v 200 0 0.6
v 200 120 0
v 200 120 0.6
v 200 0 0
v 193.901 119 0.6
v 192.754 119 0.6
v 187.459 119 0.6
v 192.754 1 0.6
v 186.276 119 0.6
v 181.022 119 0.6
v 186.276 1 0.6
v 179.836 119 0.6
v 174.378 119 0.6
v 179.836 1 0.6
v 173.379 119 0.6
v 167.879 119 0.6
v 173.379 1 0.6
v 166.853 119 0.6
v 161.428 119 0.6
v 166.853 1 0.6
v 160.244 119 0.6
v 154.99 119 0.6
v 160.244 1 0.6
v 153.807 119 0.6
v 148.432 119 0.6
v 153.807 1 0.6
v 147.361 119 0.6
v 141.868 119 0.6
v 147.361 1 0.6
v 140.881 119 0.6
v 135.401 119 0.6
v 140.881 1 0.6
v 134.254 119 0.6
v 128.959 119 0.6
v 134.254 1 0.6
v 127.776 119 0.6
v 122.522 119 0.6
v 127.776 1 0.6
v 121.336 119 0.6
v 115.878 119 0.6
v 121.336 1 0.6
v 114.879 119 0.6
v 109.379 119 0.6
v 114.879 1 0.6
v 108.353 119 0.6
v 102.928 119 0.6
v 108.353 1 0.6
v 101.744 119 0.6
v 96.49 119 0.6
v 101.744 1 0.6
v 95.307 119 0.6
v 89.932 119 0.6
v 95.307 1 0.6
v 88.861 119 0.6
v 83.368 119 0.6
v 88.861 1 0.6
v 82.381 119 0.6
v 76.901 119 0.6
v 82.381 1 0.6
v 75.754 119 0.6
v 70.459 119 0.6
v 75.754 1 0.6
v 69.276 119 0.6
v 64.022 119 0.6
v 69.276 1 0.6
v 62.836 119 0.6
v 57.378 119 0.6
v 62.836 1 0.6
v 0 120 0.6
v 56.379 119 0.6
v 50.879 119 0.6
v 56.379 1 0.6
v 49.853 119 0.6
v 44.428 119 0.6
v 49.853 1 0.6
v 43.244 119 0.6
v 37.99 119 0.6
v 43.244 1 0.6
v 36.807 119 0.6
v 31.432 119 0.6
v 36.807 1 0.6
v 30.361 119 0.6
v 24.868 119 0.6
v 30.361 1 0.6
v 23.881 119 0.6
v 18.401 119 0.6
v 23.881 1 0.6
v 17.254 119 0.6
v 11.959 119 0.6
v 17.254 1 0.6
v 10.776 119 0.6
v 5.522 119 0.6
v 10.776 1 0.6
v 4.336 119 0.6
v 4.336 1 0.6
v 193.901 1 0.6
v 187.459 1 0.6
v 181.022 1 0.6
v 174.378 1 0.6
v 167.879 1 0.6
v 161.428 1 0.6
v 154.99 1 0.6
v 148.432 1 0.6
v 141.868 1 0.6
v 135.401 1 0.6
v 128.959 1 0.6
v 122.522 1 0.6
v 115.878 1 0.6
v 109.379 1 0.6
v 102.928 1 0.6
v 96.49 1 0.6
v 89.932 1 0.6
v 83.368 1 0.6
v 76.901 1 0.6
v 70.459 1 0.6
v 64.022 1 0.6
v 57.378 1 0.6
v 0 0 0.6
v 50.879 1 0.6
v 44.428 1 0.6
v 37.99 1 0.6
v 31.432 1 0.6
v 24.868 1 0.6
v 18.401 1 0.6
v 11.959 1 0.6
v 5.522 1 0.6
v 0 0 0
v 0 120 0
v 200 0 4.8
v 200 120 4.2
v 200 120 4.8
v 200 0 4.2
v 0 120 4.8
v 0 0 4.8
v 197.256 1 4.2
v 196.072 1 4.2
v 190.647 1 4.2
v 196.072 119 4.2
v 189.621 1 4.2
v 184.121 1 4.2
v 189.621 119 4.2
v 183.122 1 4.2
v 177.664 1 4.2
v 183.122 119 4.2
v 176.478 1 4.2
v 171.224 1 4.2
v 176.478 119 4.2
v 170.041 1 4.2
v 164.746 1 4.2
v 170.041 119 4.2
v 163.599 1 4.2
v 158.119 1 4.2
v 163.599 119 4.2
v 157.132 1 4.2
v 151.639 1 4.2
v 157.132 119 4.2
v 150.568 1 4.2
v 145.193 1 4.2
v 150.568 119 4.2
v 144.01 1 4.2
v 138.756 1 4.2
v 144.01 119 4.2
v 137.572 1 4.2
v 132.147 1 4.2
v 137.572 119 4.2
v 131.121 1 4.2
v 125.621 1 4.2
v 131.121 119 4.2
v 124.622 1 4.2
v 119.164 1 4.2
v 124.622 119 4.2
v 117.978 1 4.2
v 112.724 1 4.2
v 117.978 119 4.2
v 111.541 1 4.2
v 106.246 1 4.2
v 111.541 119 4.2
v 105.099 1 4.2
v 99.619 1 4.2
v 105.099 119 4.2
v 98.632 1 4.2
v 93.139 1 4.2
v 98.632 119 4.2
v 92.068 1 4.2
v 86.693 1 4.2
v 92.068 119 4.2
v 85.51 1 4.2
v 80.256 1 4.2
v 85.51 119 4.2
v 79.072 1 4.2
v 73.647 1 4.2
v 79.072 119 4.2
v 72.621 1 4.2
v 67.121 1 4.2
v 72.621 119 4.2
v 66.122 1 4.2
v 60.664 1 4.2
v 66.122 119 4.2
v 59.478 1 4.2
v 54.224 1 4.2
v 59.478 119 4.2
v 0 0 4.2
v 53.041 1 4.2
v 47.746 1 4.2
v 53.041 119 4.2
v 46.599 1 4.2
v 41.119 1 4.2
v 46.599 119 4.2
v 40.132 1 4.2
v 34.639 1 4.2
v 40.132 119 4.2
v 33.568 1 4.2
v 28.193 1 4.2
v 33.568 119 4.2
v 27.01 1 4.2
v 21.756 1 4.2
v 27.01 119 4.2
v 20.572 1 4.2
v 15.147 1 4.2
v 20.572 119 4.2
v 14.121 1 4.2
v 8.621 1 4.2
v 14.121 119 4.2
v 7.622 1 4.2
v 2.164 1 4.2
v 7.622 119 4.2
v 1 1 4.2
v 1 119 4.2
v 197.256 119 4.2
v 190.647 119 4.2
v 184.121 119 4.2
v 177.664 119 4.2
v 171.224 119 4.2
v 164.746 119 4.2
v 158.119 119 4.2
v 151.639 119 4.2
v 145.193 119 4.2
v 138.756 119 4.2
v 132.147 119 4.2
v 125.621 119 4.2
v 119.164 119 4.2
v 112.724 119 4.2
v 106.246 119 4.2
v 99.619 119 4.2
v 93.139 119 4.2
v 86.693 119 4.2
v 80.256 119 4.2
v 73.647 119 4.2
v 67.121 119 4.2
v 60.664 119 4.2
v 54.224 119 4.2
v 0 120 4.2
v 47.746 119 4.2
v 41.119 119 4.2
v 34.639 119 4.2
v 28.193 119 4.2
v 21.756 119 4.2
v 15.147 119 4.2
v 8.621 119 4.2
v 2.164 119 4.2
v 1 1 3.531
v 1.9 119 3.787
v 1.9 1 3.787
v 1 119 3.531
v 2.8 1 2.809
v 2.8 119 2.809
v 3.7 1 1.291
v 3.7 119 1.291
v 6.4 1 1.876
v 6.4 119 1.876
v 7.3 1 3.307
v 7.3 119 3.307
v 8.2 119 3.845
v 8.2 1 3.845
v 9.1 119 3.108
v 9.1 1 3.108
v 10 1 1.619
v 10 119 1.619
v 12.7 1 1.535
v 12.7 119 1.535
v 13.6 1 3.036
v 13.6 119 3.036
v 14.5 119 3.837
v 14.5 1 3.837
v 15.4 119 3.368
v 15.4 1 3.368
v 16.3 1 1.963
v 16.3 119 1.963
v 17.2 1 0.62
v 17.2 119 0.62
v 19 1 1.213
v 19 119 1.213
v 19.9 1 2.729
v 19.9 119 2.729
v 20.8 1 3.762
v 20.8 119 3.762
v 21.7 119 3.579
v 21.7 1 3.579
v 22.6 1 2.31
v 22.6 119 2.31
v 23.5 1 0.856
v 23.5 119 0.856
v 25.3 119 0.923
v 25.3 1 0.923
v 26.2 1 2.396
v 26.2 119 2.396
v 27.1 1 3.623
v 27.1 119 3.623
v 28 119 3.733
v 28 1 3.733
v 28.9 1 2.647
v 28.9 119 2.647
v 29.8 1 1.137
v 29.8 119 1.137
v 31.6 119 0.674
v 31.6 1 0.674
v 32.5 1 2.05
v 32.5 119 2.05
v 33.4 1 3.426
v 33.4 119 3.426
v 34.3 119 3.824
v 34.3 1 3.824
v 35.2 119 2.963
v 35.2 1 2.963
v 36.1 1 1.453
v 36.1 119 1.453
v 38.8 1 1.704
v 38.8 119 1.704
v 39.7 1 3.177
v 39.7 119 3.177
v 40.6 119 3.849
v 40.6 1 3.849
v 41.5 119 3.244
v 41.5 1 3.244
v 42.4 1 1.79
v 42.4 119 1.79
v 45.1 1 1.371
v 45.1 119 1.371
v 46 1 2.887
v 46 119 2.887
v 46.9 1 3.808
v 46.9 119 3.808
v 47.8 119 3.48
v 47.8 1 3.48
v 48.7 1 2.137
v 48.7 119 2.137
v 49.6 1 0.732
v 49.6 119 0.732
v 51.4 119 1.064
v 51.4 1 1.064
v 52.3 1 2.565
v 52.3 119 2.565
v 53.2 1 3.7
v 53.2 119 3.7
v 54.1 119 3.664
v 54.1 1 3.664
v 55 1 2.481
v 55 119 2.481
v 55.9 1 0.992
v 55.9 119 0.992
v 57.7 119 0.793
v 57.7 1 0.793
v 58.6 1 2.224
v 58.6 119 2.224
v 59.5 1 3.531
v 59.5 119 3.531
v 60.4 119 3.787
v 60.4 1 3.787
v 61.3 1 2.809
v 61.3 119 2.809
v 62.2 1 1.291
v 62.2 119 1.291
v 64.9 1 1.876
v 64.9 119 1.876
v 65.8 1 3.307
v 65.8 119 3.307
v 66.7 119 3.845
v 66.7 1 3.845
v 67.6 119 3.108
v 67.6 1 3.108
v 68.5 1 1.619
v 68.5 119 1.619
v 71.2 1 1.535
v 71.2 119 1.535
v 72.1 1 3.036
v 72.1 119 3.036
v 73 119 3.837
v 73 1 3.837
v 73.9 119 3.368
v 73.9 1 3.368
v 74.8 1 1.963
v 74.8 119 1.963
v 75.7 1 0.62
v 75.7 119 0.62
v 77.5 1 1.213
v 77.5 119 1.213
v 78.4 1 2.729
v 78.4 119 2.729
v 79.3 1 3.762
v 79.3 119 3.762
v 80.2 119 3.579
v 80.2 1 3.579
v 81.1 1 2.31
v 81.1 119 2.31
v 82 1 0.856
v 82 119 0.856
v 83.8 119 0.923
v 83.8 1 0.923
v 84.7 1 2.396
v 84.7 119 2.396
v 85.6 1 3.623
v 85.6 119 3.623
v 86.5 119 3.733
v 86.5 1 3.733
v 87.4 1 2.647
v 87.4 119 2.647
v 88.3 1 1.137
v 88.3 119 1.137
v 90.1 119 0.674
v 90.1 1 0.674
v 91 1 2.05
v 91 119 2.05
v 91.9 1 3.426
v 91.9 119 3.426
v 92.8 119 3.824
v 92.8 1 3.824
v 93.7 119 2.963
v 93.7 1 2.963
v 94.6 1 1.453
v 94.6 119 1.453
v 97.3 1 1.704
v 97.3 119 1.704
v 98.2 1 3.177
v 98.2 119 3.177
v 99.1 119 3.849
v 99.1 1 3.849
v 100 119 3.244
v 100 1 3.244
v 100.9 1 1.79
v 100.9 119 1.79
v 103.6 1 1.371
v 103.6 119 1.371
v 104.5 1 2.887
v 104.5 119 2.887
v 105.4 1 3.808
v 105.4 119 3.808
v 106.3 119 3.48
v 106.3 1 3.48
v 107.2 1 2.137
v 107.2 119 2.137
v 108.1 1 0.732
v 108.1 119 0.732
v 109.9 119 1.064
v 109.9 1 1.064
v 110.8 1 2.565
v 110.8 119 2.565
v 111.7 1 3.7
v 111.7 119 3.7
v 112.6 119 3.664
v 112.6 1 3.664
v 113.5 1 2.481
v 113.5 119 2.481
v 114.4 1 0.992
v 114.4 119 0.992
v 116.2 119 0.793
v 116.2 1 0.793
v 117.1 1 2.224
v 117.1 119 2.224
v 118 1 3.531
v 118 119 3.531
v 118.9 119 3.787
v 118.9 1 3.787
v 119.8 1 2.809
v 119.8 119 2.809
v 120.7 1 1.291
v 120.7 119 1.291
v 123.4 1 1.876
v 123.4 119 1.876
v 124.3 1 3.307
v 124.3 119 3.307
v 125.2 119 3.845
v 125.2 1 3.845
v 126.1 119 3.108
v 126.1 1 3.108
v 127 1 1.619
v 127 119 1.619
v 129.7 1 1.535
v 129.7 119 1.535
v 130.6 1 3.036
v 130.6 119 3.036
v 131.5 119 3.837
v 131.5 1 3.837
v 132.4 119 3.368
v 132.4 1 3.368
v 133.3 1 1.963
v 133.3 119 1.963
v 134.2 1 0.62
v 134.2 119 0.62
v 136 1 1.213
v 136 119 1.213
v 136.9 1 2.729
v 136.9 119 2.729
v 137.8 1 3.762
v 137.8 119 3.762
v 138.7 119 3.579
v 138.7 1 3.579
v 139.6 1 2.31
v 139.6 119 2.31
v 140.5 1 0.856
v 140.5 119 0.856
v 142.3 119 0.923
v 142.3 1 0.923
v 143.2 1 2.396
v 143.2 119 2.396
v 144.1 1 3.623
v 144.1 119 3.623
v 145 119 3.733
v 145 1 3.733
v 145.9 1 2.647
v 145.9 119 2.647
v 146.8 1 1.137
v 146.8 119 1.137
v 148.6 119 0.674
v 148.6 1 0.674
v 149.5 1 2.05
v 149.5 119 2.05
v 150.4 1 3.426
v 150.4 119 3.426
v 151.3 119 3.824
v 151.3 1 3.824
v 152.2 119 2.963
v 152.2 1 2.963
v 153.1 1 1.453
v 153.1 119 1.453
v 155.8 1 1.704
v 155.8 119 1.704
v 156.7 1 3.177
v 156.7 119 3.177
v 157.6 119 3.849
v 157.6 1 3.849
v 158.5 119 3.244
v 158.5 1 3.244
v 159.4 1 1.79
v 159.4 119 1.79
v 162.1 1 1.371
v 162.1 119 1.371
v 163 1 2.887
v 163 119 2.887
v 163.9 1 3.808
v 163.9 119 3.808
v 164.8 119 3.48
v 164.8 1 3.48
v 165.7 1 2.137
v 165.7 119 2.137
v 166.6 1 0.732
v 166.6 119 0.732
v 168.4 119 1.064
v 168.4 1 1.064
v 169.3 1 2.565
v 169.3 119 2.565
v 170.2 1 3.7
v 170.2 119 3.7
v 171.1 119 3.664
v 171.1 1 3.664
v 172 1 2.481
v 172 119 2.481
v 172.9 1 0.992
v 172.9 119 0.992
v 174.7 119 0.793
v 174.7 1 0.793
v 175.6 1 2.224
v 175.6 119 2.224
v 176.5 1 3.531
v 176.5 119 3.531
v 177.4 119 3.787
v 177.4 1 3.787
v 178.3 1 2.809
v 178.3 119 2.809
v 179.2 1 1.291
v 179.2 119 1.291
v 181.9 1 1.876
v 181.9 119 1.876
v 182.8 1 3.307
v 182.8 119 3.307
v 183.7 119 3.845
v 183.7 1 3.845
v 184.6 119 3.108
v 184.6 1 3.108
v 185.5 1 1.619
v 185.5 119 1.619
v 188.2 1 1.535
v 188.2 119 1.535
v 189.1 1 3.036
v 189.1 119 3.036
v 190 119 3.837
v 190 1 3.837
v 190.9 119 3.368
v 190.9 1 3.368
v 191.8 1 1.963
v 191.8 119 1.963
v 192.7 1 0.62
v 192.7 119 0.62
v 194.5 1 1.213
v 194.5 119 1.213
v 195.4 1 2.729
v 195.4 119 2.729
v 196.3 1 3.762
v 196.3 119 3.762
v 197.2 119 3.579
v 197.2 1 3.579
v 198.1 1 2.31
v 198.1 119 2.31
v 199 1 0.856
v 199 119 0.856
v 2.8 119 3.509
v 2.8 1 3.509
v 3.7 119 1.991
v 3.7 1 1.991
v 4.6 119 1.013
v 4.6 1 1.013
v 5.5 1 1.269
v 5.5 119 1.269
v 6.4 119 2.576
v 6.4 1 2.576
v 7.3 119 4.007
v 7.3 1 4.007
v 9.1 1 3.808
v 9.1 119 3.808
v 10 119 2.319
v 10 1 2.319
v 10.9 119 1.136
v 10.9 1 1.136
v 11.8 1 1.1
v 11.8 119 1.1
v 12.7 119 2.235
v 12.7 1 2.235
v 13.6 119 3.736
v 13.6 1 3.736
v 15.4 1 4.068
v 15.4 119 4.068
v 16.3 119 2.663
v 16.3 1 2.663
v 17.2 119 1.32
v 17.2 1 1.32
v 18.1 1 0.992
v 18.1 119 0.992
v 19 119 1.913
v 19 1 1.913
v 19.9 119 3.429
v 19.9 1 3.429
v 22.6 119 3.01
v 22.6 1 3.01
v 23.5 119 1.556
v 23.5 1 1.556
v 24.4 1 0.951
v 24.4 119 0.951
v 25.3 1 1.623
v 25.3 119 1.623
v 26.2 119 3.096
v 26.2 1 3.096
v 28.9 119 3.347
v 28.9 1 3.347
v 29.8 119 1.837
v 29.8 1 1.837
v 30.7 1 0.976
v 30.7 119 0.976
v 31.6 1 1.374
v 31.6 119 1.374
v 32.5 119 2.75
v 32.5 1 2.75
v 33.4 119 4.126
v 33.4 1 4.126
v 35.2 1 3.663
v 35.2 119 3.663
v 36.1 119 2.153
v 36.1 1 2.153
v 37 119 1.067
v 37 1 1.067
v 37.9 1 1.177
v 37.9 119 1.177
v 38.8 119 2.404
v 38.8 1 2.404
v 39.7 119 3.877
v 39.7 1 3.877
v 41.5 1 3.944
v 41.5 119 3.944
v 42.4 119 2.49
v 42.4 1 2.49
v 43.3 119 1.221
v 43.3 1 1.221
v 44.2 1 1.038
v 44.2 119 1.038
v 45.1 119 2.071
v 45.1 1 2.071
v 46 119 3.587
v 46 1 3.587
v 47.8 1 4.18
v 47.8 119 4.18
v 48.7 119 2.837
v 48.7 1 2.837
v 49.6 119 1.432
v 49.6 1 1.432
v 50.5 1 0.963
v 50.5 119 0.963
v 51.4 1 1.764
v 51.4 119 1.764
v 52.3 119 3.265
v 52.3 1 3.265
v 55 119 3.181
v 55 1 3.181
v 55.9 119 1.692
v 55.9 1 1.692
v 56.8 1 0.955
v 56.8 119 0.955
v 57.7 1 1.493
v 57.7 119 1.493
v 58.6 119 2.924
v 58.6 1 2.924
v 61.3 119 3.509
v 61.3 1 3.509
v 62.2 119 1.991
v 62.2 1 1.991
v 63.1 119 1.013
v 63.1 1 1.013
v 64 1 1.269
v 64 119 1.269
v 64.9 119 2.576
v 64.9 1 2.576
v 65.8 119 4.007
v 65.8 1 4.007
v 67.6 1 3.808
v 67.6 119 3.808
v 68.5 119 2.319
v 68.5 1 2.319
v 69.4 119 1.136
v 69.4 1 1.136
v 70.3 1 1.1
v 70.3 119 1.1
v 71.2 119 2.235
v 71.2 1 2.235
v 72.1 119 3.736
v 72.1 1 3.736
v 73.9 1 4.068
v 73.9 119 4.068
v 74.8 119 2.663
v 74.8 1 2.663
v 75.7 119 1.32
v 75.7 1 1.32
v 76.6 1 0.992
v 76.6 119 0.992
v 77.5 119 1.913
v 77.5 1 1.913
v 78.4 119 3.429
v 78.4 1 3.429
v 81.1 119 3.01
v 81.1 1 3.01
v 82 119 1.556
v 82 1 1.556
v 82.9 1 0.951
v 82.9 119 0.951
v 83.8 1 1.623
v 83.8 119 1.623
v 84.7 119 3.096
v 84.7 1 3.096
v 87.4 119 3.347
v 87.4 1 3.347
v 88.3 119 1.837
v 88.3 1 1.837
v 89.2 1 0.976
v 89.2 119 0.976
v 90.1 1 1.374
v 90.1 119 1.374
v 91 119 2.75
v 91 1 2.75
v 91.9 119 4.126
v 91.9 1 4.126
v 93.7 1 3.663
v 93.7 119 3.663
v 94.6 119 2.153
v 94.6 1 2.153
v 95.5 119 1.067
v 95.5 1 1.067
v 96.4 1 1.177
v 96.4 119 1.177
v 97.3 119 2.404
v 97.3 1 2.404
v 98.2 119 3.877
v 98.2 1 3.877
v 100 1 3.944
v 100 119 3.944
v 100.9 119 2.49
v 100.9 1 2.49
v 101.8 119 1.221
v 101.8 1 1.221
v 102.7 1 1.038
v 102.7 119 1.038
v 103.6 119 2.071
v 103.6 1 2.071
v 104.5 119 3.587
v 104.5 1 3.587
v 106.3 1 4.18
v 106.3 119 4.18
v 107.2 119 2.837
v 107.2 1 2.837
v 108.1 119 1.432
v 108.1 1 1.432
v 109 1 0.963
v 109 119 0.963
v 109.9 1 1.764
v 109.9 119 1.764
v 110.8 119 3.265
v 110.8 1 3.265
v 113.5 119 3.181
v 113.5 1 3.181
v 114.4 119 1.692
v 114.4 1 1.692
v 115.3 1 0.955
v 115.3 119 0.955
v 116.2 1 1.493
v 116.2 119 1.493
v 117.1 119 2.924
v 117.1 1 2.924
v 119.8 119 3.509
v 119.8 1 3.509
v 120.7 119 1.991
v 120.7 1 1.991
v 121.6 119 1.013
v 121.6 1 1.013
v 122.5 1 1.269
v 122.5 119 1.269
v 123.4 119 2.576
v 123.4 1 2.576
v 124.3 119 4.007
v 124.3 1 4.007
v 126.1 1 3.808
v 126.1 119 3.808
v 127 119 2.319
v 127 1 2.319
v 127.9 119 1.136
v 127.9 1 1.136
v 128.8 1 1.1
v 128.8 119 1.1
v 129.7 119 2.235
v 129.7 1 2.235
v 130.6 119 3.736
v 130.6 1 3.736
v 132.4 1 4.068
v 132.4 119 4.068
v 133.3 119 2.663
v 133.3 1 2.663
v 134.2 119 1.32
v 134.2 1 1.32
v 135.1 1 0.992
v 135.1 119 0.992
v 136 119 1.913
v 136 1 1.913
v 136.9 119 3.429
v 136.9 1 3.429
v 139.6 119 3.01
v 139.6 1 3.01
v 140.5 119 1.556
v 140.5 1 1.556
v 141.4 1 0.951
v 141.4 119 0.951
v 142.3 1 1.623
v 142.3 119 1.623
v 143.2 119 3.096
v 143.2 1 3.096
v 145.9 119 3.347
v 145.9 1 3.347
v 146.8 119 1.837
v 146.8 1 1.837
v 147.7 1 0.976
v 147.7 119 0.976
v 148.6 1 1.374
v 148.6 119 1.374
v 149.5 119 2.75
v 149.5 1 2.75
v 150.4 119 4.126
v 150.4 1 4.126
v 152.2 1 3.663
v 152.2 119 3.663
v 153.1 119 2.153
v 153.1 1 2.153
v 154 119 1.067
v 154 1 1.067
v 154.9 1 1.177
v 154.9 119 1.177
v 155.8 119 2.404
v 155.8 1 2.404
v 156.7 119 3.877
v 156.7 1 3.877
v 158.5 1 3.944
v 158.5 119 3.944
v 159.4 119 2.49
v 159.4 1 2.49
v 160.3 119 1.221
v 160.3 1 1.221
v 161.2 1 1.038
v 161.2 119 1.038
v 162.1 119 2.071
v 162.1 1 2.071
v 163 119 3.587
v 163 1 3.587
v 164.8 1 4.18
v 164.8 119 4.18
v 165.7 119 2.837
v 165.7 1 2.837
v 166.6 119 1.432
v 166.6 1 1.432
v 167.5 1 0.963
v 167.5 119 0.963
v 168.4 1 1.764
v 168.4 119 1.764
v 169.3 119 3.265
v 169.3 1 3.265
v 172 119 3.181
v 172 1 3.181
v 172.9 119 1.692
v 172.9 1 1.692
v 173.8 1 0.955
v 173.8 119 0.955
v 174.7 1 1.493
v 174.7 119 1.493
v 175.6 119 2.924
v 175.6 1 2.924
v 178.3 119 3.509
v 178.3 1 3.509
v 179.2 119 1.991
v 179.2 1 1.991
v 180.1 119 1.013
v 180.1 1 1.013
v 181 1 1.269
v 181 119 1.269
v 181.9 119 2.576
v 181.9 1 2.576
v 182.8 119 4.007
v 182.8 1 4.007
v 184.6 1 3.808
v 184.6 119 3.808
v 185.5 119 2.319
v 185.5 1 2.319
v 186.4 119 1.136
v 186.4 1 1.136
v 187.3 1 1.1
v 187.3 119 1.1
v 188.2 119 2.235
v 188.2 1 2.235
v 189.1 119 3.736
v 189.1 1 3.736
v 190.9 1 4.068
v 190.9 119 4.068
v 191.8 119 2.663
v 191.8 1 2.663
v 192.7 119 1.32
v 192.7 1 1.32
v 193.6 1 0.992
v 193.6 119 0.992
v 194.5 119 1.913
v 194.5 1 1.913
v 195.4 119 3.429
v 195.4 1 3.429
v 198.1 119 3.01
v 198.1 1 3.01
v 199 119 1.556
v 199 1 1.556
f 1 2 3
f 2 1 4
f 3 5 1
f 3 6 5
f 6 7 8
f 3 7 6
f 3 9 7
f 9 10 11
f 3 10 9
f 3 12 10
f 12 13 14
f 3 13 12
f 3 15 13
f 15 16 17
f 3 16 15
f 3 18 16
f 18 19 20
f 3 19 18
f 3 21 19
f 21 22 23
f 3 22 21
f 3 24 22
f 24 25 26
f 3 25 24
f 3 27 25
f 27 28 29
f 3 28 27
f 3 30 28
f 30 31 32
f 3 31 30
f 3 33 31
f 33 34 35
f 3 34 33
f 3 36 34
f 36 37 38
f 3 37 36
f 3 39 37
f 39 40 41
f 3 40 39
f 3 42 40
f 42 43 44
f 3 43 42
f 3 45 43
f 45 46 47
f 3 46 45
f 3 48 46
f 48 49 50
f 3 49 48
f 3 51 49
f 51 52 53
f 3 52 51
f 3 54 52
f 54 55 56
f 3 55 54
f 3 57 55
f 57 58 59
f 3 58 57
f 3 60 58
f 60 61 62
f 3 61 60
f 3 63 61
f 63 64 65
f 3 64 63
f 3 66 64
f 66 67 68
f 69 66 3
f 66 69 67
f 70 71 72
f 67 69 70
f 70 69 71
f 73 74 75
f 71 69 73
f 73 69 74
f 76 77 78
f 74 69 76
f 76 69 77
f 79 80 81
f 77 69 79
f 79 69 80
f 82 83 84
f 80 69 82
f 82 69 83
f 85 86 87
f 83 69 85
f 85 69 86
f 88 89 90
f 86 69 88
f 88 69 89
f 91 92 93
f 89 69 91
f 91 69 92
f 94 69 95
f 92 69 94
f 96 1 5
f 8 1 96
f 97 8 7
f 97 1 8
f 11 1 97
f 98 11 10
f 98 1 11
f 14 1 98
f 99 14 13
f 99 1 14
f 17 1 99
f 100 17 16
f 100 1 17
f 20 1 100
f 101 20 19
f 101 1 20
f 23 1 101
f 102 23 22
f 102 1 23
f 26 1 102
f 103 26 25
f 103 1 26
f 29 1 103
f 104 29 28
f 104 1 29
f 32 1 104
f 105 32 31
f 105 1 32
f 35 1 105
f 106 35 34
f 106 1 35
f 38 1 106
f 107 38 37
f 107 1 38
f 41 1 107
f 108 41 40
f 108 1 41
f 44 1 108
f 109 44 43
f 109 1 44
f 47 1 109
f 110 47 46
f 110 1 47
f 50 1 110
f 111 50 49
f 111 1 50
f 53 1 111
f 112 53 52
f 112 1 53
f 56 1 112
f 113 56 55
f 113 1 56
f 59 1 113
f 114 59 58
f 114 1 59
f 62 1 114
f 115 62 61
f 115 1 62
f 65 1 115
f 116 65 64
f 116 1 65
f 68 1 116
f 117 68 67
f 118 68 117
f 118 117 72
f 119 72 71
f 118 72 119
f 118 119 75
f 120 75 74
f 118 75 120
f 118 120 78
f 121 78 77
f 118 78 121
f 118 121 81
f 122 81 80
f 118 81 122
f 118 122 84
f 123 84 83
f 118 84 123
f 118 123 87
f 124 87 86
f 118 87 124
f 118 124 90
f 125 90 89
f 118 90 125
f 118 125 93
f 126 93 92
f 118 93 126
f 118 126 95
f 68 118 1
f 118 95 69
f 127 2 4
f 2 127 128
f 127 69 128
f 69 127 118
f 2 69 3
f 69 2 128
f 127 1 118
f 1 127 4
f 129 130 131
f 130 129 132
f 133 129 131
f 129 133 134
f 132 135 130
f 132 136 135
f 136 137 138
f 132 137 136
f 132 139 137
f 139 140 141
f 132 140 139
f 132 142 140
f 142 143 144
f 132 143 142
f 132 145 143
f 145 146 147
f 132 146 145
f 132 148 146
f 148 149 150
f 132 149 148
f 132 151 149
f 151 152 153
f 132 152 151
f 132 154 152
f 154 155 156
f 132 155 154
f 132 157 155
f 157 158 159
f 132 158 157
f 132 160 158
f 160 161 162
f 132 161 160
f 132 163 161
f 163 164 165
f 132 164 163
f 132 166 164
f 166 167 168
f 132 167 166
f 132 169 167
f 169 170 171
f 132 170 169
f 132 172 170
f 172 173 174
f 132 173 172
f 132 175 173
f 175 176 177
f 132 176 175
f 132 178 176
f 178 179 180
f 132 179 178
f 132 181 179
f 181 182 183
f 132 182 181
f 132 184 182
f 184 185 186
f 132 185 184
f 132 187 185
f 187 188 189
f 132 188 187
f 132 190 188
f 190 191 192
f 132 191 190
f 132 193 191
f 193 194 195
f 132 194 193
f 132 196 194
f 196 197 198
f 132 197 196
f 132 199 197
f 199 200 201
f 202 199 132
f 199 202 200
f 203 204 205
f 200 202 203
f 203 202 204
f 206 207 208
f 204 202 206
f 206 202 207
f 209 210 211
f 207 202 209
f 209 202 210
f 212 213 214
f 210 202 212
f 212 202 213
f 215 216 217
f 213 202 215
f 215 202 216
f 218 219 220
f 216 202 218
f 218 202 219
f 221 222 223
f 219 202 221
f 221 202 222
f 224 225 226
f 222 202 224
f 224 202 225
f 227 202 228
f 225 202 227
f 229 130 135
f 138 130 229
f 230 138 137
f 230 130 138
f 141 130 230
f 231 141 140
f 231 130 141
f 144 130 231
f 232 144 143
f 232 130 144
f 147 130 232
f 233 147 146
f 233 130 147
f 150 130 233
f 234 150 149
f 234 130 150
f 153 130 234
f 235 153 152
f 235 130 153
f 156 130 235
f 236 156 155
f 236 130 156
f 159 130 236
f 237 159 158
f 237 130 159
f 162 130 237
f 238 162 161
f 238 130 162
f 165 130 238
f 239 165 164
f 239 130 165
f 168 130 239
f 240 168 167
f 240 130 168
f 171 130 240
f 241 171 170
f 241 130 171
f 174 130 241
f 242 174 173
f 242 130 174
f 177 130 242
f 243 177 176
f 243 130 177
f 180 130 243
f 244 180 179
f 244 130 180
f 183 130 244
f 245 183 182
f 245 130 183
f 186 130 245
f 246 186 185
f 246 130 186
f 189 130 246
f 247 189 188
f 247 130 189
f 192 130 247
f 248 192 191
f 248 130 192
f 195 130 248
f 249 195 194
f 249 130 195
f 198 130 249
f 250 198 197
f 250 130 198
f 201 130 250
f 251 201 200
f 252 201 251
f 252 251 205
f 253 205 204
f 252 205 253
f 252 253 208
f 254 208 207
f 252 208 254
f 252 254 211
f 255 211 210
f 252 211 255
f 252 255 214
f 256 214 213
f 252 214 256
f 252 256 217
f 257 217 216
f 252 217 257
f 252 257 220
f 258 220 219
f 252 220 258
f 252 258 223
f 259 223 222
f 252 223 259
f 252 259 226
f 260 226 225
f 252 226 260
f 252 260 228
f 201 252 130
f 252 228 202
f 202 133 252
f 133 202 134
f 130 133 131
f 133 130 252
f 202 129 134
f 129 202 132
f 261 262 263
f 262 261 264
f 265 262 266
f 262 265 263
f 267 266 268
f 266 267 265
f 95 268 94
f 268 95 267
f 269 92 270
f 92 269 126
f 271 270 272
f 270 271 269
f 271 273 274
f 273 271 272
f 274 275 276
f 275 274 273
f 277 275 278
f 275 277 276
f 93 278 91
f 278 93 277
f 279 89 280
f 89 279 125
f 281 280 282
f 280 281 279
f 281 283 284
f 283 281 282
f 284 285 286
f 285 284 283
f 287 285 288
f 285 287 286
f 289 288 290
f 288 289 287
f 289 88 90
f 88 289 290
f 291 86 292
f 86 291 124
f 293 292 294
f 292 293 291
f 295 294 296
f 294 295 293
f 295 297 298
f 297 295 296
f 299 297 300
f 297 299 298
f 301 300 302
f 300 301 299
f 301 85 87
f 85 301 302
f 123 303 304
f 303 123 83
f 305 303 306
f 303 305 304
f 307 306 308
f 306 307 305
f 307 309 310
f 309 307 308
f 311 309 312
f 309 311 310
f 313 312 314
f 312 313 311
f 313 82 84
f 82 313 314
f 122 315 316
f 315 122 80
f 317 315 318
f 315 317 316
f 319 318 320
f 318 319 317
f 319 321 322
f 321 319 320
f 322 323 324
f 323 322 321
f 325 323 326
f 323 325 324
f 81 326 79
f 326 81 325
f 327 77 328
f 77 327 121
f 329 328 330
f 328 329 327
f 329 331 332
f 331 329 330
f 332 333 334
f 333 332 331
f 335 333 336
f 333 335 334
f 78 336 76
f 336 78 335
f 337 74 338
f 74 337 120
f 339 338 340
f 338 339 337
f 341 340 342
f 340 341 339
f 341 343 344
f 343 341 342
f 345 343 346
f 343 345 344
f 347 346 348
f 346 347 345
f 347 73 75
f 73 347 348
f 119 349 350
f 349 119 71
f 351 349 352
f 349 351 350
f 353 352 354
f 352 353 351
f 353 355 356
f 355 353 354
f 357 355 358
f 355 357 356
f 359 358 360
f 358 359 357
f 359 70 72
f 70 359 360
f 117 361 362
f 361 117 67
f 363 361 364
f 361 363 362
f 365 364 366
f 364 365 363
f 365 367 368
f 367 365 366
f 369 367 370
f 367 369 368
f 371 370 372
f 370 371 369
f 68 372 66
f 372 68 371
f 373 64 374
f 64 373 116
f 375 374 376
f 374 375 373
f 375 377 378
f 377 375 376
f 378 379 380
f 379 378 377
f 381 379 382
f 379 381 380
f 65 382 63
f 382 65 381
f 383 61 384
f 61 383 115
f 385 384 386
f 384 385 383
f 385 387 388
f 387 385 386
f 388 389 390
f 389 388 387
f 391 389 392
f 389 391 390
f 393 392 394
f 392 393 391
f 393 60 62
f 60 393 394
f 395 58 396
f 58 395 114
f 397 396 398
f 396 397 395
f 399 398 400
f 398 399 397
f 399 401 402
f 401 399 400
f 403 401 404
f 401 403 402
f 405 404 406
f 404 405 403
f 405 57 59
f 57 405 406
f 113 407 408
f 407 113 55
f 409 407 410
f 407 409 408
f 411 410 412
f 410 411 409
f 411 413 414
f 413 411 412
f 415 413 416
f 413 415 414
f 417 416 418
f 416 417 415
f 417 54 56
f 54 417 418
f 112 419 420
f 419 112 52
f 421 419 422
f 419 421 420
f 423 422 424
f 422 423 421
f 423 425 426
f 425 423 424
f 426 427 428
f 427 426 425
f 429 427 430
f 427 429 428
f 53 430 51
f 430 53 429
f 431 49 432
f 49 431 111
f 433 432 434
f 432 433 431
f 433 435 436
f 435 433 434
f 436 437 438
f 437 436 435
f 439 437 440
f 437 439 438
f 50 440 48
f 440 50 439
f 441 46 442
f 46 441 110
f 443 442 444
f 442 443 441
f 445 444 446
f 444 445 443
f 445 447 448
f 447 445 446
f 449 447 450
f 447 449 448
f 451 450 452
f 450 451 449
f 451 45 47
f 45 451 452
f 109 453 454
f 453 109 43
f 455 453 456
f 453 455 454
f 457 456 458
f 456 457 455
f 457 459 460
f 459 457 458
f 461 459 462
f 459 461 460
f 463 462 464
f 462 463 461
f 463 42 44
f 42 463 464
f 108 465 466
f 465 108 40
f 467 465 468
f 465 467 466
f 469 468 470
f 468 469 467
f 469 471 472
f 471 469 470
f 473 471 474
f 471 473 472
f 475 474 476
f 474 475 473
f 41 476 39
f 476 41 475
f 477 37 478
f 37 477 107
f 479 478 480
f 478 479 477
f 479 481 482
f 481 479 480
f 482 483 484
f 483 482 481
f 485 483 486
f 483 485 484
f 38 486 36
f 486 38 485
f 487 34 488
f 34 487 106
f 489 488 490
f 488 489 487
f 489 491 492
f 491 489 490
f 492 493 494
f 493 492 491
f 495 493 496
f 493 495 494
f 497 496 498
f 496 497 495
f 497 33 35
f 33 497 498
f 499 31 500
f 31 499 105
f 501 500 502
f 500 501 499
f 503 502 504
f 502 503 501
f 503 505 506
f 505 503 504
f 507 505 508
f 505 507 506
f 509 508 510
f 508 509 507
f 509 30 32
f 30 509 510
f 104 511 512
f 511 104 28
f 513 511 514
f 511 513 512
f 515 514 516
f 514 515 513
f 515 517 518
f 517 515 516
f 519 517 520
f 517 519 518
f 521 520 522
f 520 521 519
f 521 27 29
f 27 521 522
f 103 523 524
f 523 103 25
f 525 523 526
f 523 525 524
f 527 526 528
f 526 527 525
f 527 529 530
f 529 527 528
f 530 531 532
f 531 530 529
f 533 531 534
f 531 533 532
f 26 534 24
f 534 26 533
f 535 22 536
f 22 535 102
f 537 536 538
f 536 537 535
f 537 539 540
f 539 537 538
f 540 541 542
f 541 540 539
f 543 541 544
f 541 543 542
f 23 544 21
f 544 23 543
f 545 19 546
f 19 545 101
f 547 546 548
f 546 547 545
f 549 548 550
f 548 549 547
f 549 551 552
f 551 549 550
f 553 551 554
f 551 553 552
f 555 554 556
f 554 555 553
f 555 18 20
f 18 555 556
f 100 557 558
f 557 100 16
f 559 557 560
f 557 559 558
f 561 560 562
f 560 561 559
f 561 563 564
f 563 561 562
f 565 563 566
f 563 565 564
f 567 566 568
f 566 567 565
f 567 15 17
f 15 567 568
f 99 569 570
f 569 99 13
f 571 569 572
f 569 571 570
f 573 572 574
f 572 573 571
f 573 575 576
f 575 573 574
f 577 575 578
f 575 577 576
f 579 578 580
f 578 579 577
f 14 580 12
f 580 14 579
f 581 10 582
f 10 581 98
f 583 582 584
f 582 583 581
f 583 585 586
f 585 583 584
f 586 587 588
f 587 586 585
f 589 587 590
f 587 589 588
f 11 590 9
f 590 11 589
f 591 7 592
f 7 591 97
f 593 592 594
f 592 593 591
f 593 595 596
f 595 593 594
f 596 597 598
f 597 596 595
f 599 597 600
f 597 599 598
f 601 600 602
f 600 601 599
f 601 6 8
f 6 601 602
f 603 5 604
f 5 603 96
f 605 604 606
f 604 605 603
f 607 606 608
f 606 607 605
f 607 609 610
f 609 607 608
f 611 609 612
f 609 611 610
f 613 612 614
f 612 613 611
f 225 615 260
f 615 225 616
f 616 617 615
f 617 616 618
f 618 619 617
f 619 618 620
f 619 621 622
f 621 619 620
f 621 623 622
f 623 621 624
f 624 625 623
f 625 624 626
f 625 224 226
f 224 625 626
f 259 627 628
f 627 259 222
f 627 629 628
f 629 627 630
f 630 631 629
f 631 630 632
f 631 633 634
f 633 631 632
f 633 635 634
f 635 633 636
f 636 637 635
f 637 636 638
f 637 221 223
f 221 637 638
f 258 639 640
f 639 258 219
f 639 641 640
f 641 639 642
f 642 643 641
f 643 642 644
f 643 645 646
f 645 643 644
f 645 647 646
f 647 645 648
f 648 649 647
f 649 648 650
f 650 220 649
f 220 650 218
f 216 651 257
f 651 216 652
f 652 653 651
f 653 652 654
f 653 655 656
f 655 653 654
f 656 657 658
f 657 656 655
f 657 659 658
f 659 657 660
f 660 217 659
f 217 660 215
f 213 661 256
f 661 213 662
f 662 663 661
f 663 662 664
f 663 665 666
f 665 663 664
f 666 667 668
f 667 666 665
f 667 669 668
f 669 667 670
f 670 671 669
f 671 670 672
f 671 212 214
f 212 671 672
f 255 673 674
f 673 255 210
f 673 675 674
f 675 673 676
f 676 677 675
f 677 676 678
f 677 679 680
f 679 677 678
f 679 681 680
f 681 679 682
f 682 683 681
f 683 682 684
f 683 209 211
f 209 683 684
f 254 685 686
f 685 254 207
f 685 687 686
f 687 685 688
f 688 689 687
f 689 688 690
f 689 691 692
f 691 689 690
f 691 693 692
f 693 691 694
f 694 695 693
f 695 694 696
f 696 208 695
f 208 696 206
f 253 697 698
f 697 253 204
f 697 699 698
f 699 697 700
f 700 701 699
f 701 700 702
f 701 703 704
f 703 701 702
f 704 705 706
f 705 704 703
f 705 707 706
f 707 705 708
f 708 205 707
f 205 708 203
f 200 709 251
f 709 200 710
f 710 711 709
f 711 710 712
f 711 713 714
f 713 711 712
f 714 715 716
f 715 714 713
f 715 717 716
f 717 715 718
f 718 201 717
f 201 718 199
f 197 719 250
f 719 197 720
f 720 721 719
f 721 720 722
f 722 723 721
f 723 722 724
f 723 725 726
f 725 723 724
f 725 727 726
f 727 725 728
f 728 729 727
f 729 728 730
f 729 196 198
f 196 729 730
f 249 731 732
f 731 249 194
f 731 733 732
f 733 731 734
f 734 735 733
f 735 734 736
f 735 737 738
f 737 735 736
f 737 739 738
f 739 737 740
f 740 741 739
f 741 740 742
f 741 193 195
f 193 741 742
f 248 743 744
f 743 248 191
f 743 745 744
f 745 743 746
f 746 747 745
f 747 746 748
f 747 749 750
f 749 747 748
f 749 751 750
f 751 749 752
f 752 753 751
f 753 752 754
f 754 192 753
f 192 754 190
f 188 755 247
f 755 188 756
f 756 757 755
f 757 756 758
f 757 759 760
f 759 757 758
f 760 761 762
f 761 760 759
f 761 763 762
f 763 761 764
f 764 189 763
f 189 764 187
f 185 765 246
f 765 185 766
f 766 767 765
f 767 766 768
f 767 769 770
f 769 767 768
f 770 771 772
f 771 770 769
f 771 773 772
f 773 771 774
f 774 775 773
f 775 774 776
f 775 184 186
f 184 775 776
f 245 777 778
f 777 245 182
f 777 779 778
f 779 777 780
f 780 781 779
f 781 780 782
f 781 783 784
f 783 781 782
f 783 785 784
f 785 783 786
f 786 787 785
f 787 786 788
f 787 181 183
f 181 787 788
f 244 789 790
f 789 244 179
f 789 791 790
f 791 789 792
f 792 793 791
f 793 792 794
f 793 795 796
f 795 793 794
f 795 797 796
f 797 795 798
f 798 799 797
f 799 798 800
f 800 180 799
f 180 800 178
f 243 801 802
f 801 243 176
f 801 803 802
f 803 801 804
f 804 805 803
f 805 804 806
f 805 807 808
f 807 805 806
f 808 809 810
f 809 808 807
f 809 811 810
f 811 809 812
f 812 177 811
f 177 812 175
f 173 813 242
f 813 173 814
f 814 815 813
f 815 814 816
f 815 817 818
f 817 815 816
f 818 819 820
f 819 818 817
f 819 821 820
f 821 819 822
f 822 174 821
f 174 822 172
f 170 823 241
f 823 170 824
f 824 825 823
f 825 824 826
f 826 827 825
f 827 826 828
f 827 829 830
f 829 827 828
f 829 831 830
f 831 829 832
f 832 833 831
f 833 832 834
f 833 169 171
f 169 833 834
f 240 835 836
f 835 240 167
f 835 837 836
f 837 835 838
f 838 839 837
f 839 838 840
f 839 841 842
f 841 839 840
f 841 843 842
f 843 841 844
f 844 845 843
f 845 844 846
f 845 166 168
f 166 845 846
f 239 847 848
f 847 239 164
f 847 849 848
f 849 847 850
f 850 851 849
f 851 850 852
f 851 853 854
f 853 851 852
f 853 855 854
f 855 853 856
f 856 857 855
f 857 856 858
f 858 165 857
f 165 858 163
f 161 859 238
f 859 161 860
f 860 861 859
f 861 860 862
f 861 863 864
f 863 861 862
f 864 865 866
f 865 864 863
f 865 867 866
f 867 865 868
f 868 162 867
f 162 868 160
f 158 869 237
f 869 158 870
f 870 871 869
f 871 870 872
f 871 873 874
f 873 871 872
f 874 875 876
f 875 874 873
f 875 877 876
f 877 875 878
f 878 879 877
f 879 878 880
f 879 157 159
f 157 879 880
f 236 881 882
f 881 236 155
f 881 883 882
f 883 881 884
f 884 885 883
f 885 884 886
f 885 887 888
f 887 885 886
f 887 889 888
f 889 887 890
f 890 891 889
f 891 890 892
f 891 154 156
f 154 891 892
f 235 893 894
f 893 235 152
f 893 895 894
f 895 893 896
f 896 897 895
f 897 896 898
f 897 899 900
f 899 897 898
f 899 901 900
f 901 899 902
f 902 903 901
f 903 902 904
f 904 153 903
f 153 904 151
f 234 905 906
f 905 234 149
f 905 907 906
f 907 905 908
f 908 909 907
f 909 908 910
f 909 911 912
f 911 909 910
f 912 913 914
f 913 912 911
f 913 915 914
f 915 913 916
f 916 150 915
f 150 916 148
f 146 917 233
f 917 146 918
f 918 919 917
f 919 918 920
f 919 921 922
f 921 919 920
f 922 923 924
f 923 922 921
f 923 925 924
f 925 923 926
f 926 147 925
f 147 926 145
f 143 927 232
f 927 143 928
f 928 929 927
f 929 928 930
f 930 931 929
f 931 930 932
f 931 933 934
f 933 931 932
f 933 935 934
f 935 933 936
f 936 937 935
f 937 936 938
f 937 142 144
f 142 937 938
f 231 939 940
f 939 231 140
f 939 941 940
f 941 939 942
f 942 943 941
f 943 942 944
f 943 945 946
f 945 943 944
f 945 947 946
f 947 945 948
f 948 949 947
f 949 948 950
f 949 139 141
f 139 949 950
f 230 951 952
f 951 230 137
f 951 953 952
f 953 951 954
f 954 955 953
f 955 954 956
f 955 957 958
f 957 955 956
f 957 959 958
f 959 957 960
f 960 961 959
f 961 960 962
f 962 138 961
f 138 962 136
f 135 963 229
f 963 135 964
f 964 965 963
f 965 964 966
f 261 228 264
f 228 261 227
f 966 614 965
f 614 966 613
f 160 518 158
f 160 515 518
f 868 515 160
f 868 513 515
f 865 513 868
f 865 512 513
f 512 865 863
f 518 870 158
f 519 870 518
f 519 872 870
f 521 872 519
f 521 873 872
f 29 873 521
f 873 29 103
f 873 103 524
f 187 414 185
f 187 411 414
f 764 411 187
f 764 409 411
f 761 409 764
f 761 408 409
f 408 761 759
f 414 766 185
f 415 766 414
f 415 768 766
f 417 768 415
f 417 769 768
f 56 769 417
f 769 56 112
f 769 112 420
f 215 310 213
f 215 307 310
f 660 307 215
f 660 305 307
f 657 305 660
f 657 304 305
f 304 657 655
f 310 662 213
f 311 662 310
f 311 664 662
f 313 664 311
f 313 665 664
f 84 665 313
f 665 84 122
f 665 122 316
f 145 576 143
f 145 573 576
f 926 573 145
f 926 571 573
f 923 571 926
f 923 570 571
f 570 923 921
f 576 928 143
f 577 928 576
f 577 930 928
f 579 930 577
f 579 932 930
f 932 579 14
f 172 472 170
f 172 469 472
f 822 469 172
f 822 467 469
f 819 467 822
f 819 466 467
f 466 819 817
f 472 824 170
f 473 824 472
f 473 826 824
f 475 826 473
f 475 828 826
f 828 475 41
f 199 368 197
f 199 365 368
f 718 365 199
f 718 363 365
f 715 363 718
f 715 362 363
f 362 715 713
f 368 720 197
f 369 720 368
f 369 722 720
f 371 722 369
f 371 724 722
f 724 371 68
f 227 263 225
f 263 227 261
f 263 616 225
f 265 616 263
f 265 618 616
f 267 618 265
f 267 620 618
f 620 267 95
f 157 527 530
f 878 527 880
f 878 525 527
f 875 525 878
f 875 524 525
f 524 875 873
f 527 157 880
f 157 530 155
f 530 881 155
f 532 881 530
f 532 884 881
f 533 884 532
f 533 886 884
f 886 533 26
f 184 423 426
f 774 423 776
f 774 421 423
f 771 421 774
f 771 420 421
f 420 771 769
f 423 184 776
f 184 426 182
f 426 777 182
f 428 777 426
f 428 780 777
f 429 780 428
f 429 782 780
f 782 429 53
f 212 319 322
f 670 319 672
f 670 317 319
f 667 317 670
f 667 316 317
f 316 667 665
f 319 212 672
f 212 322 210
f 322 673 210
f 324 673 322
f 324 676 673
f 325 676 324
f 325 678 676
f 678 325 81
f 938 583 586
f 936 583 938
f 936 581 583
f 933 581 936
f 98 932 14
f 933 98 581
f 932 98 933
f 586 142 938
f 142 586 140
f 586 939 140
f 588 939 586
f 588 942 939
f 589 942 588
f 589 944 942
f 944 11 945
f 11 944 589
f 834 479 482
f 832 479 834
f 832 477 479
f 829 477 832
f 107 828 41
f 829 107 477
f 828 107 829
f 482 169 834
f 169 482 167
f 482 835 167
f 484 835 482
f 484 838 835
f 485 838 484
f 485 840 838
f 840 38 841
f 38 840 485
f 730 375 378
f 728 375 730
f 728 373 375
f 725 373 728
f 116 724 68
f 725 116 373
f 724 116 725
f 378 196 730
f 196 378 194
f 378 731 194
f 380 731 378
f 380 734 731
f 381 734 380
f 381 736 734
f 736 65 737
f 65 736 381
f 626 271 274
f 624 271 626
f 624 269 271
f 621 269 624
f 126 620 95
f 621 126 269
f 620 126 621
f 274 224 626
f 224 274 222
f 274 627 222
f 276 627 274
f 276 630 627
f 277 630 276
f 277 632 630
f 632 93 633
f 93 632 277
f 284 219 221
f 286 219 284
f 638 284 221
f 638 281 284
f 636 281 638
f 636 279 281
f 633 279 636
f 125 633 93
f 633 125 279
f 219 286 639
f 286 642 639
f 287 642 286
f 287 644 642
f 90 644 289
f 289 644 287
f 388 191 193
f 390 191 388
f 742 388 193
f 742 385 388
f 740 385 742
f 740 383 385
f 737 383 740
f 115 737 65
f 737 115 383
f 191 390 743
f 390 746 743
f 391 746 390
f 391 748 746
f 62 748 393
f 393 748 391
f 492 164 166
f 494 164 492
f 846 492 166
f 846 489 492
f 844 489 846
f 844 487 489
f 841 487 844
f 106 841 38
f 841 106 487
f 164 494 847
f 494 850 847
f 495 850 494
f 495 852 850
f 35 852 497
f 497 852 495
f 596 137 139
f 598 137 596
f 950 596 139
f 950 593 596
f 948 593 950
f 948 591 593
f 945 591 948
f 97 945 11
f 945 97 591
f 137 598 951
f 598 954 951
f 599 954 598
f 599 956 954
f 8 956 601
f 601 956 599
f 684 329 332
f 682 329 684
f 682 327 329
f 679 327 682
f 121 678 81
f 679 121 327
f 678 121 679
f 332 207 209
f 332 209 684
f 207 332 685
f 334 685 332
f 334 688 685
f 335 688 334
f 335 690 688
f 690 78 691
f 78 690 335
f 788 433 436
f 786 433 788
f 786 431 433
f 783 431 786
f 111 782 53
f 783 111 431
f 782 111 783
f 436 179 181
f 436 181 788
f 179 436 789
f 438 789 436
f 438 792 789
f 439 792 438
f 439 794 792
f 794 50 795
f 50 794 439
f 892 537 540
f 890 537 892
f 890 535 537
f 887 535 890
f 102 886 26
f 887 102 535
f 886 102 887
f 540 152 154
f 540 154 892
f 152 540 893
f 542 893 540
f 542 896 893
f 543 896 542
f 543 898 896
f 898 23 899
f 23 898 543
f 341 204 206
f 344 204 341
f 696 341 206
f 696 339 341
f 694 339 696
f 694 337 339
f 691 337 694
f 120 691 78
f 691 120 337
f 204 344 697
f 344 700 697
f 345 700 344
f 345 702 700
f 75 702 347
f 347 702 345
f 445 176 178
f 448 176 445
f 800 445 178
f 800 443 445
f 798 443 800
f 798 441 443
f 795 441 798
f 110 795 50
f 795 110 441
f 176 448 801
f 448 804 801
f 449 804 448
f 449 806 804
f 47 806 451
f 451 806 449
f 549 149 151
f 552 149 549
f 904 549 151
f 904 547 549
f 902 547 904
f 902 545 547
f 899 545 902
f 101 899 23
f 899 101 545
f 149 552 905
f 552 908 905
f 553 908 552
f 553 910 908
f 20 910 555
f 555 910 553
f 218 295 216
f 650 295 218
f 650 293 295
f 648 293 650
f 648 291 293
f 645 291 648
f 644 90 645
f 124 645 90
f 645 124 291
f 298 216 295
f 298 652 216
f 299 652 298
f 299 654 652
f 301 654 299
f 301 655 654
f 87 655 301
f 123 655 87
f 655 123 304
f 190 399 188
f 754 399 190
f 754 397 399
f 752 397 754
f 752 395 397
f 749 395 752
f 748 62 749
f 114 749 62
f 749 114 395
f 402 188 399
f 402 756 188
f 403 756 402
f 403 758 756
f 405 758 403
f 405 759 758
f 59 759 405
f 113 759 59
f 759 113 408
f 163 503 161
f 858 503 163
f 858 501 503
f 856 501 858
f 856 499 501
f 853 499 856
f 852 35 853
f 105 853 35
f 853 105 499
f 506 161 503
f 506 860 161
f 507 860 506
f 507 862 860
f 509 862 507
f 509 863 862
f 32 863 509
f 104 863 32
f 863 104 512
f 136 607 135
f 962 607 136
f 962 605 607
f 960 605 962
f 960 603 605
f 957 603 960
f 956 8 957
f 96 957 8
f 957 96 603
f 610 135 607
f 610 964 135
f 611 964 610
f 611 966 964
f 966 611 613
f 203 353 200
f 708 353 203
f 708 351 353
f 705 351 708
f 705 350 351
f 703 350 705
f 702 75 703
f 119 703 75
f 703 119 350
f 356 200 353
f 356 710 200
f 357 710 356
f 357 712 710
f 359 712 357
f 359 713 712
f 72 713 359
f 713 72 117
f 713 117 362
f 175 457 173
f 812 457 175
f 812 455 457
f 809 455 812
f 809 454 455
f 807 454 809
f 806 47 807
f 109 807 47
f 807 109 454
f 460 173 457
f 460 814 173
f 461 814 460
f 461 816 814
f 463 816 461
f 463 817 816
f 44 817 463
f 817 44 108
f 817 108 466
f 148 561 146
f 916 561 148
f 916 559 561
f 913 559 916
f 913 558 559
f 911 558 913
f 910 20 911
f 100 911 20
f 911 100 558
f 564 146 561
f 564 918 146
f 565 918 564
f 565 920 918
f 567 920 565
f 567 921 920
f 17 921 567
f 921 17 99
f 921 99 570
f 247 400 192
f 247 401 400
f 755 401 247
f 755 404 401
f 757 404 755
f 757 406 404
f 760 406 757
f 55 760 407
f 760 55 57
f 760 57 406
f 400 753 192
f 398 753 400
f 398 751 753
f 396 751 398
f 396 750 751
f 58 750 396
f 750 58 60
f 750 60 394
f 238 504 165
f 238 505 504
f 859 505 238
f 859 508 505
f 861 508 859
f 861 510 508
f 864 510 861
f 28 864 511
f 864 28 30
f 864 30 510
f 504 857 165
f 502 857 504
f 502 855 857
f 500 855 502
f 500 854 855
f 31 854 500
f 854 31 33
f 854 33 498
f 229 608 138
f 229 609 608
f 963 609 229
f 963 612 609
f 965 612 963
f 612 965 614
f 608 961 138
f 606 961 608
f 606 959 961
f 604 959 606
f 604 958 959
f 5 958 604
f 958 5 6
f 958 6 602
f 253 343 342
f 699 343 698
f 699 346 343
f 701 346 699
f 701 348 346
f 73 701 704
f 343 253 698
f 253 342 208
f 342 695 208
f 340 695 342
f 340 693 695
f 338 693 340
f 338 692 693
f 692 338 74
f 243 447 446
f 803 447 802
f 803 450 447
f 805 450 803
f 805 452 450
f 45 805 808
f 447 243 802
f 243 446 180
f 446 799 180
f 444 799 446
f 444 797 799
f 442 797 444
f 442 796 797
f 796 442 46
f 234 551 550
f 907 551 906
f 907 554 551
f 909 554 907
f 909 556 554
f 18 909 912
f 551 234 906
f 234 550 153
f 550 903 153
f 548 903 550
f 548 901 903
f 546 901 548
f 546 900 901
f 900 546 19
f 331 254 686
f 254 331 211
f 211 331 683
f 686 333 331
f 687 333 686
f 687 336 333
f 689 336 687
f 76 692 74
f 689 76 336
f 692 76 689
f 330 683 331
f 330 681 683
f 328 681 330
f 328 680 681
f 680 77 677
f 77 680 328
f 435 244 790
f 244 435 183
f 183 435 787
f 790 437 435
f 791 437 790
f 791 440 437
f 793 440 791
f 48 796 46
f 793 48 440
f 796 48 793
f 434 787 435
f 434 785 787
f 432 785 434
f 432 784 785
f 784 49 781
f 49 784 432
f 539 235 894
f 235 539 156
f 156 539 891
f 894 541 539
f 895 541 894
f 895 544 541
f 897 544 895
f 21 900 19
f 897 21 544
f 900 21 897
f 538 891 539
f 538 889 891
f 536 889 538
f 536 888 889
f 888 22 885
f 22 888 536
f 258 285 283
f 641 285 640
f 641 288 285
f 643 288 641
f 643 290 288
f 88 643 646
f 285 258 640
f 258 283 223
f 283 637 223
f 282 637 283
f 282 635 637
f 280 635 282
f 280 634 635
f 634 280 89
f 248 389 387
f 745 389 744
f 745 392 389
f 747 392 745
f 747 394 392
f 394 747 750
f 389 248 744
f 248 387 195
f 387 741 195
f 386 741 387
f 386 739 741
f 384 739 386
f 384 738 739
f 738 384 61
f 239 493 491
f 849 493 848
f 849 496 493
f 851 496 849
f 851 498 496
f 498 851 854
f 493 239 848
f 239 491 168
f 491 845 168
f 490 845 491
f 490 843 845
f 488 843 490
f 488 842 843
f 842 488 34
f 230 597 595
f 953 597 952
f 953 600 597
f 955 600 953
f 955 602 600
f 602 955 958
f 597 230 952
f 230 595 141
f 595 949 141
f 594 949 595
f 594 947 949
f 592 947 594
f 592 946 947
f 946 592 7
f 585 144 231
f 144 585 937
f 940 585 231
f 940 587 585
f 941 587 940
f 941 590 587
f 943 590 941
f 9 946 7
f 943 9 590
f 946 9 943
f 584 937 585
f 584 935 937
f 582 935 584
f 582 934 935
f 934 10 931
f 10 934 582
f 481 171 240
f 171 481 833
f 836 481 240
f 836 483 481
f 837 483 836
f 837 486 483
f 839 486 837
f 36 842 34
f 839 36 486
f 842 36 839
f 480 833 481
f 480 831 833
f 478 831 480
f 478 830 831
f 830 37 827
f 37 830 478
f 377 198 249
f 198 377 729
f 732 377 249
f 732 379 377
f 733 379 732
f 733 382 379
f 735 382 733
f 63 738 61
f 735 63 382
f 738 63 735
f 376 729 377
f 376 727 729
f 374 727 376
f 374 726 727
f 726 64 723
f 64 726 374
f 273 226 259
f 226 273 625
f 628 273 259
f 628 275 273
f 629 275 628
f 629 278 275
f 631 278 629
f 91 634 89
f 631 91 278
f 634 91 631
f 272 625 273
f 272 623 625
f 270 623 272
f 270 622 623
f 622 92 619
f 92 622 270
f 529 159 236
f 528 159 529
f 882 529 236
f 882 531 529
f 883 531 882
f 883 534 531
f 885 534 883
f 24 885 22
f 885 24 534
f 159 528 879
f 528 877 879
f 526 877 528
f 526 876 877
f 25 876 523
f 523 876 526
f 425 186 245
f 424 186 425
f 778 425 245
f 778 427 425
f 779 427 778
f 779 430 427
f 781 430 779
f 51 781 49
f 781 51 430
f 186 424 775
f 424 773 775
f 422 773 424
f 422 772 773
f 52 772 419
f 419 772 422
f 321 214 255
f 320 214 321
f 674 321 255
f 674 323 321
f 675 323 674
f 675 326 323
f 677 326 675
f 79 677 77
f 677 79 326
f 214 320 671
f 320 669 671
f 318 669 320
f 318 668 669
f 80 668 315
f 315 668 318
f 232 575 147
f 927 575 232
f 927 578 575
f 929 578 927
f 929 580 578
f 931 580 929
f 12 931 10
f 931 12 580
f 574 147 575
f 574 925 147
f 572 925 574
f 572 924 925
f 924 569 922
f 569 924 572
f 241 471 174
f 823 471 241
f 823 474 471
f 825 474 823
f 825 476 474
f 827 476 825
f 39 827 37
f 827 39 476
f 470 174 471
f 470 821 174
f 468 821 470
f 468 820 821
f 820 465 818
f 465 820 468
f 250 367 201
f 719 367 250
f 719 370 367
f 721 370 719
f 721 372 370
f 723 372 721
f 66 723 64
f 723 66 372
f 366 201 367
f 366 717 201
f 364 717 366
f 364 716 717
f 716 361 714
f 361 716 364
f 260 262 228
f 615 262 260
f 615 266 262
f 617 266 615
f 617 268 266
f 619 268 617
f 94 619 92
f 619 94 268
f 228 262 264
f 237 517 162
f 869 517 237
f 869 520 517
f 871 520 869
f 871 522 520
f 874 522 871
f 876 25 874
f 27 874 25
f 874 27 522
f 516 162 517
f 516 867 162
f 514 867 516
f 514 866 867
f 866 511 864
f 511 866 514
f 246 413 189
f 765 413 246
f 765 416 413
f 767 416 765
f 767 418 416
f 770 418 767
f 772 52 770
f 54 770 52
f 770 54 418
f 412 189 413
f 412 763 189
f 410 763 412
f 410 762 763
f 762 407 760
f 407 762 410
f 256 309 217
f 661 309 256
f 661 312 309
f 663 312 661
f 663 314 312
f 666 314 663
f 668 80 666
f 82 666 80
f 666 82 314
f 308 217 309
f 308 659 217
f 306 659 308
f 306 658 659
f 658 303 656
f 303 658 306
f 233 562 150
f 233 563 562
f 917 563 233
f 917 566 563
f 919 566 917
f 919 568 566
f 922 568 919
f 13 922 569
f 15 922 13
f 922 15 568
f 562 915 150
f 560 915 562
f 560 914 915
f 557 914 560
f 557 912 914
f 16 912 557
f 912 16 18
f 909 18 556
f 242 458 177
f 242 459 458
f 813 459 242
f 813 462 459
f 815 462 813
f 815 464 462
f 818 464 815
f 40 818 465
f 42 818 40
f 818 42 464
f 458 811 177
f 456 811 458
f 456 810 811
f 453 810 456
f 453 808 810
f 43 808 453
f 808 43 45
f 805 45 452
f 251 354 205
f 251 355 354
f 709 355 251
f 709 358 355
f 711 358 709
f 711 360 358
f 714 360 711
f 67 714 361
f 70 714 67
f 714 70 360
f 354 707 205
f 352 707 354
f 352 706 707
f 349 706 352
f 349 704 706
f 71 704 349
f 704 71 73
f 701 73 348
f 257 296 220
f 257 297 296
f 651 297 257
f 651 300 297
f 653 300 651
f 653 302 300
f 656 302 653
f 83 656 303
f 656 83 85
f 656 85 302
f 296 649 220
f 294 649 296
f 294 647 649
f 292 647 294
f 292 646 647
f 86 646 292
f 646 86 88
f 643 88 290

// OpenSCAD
$fn=64;

// Corrugated cardboard sheet (single-wall): two liners + sinusoidal fluting between
// Units: mm

// ---- Parameters ----
sheet_len = 200;
sheet_wid = 120;

liner_th = 0.6;          // thickness of each flat liner
flute_amp = 1.8;         // amplitude of flute (peak-to-mid)
flute_pitch = 6.5;       // wavelength along X
flute_wall = 0.7;        // thickness of flute web (approx)
edge_margin = 1.0;       // keep flutes slightly inset from edges

// Resolution controls
nx = 220;                // segments along length
ny = 90;                 // segments along width

// Derived
core_h = 2*flute_amp;     // distance between liners (excluding liner thickness)
total_th = core_h + 2*liner_th;

// ---- Helpers ----
function clamp(v, a, b) = v < a ? a : (v > b ? b : v);

// Sinusoidal mid-surface for flute (centered between liners)
function z_mid(x) = liner_th + flute_amp + flute_amp * sin(360 * x / flute_pitch);

// Build a thin "web" surface by giving the sinusoid a small thickness in Z
module flute_web() {
    x0 = edge_margin;
    x1 = sheet_len - edge_margin;
    y0 = edge_margin;
    y1 = sheet_wid - edge_margin;

    dx = (x1 - x0) / nx;
    dy = (y1 - y0) / ny;

    // Create a polyhedron as a thickened heightfield (top and bottom surfaces)
    // Vertices: (nx+1)*(ny+1) for bottom + same for top
    verts = [
        for (j = [0:ny], i = [0:nx]) 
            let(x = x0 + i*dx, y = y0 + j*dy, zm = z_mid(x))
            [x, y, zm - flute_wall/2],
        for (j = [0:ny], i = [0:nx]) 
            let(x = x0 + i*dx, y = y0 + j*dy, zm = z_mid(x))
            [x, y, zm + flute_wall/2]
    ];

    // Faces for bottom and top grids + side walls
    // Index helpers
    function idx(i,j) = j*(nx+1) + i;
    function idxT(i,j) = (ny+1)*(nx+1) + idx(i,j);

    faces = concat(
        // Bottom surface (winding downward)
        [
            for (j=[0:ny-1], i=[0:nx-1])
                [ idx(i,j), idx(i+1,j), idx(i+1,j+1), idx(i,j+1) ]
        ],
        // Top surface (winding upward)
        [
            for (j=[0:ny-1], i=[0:nx-1])
                [ idxT(i,j), idxT(i,j+1), idxT(i+1,j+1), idxT(i+1,j) ]
        ],
        // Sides: i=0 and i=nx
        [
            for (j=[0:ny-1])
                [ idx(0,j), idx(0,j+1), idxT(0,j+1), idxT(0,j) ],
            for (j=[0:ny-1])
                [ idx(nx,j), idxT(nx,j), idxT(nx,j+1), idx(nx,j+1) ]
        ],
        // Sides: j=0 and j=ny
        [
            for (i=[0:nx-1])
                [ idx(i,0), idxT(i,0), idxT(i+1,0), idx(i+1,0) ],
            for (i=[0:nx-1])
                [ idx(i,ny), idx(i+1,ny), idxT(i+1,ny), idxT(i,ny) ]
        ]
    );

    polyhedron(points=verts, faces=faces, convexity=10);
}

module liner(z0) {
    translate([0,0,z0])
        cube([sheet_len, sheet_wid, liner_th], center=false);
}

// ---- Model ----
module corrugated_cardboard_sheet() {
    // Slightly warm cardboard color in preview
    color([0.78, 0.67, 0.48])
    union() {
        // Bottom liner
        liner(0);

        // Top liner
        liner(liner_th + core_h);

        // Flute web between liners
        flute_web();
    }
}

corrugated_cardboard_sheet();
